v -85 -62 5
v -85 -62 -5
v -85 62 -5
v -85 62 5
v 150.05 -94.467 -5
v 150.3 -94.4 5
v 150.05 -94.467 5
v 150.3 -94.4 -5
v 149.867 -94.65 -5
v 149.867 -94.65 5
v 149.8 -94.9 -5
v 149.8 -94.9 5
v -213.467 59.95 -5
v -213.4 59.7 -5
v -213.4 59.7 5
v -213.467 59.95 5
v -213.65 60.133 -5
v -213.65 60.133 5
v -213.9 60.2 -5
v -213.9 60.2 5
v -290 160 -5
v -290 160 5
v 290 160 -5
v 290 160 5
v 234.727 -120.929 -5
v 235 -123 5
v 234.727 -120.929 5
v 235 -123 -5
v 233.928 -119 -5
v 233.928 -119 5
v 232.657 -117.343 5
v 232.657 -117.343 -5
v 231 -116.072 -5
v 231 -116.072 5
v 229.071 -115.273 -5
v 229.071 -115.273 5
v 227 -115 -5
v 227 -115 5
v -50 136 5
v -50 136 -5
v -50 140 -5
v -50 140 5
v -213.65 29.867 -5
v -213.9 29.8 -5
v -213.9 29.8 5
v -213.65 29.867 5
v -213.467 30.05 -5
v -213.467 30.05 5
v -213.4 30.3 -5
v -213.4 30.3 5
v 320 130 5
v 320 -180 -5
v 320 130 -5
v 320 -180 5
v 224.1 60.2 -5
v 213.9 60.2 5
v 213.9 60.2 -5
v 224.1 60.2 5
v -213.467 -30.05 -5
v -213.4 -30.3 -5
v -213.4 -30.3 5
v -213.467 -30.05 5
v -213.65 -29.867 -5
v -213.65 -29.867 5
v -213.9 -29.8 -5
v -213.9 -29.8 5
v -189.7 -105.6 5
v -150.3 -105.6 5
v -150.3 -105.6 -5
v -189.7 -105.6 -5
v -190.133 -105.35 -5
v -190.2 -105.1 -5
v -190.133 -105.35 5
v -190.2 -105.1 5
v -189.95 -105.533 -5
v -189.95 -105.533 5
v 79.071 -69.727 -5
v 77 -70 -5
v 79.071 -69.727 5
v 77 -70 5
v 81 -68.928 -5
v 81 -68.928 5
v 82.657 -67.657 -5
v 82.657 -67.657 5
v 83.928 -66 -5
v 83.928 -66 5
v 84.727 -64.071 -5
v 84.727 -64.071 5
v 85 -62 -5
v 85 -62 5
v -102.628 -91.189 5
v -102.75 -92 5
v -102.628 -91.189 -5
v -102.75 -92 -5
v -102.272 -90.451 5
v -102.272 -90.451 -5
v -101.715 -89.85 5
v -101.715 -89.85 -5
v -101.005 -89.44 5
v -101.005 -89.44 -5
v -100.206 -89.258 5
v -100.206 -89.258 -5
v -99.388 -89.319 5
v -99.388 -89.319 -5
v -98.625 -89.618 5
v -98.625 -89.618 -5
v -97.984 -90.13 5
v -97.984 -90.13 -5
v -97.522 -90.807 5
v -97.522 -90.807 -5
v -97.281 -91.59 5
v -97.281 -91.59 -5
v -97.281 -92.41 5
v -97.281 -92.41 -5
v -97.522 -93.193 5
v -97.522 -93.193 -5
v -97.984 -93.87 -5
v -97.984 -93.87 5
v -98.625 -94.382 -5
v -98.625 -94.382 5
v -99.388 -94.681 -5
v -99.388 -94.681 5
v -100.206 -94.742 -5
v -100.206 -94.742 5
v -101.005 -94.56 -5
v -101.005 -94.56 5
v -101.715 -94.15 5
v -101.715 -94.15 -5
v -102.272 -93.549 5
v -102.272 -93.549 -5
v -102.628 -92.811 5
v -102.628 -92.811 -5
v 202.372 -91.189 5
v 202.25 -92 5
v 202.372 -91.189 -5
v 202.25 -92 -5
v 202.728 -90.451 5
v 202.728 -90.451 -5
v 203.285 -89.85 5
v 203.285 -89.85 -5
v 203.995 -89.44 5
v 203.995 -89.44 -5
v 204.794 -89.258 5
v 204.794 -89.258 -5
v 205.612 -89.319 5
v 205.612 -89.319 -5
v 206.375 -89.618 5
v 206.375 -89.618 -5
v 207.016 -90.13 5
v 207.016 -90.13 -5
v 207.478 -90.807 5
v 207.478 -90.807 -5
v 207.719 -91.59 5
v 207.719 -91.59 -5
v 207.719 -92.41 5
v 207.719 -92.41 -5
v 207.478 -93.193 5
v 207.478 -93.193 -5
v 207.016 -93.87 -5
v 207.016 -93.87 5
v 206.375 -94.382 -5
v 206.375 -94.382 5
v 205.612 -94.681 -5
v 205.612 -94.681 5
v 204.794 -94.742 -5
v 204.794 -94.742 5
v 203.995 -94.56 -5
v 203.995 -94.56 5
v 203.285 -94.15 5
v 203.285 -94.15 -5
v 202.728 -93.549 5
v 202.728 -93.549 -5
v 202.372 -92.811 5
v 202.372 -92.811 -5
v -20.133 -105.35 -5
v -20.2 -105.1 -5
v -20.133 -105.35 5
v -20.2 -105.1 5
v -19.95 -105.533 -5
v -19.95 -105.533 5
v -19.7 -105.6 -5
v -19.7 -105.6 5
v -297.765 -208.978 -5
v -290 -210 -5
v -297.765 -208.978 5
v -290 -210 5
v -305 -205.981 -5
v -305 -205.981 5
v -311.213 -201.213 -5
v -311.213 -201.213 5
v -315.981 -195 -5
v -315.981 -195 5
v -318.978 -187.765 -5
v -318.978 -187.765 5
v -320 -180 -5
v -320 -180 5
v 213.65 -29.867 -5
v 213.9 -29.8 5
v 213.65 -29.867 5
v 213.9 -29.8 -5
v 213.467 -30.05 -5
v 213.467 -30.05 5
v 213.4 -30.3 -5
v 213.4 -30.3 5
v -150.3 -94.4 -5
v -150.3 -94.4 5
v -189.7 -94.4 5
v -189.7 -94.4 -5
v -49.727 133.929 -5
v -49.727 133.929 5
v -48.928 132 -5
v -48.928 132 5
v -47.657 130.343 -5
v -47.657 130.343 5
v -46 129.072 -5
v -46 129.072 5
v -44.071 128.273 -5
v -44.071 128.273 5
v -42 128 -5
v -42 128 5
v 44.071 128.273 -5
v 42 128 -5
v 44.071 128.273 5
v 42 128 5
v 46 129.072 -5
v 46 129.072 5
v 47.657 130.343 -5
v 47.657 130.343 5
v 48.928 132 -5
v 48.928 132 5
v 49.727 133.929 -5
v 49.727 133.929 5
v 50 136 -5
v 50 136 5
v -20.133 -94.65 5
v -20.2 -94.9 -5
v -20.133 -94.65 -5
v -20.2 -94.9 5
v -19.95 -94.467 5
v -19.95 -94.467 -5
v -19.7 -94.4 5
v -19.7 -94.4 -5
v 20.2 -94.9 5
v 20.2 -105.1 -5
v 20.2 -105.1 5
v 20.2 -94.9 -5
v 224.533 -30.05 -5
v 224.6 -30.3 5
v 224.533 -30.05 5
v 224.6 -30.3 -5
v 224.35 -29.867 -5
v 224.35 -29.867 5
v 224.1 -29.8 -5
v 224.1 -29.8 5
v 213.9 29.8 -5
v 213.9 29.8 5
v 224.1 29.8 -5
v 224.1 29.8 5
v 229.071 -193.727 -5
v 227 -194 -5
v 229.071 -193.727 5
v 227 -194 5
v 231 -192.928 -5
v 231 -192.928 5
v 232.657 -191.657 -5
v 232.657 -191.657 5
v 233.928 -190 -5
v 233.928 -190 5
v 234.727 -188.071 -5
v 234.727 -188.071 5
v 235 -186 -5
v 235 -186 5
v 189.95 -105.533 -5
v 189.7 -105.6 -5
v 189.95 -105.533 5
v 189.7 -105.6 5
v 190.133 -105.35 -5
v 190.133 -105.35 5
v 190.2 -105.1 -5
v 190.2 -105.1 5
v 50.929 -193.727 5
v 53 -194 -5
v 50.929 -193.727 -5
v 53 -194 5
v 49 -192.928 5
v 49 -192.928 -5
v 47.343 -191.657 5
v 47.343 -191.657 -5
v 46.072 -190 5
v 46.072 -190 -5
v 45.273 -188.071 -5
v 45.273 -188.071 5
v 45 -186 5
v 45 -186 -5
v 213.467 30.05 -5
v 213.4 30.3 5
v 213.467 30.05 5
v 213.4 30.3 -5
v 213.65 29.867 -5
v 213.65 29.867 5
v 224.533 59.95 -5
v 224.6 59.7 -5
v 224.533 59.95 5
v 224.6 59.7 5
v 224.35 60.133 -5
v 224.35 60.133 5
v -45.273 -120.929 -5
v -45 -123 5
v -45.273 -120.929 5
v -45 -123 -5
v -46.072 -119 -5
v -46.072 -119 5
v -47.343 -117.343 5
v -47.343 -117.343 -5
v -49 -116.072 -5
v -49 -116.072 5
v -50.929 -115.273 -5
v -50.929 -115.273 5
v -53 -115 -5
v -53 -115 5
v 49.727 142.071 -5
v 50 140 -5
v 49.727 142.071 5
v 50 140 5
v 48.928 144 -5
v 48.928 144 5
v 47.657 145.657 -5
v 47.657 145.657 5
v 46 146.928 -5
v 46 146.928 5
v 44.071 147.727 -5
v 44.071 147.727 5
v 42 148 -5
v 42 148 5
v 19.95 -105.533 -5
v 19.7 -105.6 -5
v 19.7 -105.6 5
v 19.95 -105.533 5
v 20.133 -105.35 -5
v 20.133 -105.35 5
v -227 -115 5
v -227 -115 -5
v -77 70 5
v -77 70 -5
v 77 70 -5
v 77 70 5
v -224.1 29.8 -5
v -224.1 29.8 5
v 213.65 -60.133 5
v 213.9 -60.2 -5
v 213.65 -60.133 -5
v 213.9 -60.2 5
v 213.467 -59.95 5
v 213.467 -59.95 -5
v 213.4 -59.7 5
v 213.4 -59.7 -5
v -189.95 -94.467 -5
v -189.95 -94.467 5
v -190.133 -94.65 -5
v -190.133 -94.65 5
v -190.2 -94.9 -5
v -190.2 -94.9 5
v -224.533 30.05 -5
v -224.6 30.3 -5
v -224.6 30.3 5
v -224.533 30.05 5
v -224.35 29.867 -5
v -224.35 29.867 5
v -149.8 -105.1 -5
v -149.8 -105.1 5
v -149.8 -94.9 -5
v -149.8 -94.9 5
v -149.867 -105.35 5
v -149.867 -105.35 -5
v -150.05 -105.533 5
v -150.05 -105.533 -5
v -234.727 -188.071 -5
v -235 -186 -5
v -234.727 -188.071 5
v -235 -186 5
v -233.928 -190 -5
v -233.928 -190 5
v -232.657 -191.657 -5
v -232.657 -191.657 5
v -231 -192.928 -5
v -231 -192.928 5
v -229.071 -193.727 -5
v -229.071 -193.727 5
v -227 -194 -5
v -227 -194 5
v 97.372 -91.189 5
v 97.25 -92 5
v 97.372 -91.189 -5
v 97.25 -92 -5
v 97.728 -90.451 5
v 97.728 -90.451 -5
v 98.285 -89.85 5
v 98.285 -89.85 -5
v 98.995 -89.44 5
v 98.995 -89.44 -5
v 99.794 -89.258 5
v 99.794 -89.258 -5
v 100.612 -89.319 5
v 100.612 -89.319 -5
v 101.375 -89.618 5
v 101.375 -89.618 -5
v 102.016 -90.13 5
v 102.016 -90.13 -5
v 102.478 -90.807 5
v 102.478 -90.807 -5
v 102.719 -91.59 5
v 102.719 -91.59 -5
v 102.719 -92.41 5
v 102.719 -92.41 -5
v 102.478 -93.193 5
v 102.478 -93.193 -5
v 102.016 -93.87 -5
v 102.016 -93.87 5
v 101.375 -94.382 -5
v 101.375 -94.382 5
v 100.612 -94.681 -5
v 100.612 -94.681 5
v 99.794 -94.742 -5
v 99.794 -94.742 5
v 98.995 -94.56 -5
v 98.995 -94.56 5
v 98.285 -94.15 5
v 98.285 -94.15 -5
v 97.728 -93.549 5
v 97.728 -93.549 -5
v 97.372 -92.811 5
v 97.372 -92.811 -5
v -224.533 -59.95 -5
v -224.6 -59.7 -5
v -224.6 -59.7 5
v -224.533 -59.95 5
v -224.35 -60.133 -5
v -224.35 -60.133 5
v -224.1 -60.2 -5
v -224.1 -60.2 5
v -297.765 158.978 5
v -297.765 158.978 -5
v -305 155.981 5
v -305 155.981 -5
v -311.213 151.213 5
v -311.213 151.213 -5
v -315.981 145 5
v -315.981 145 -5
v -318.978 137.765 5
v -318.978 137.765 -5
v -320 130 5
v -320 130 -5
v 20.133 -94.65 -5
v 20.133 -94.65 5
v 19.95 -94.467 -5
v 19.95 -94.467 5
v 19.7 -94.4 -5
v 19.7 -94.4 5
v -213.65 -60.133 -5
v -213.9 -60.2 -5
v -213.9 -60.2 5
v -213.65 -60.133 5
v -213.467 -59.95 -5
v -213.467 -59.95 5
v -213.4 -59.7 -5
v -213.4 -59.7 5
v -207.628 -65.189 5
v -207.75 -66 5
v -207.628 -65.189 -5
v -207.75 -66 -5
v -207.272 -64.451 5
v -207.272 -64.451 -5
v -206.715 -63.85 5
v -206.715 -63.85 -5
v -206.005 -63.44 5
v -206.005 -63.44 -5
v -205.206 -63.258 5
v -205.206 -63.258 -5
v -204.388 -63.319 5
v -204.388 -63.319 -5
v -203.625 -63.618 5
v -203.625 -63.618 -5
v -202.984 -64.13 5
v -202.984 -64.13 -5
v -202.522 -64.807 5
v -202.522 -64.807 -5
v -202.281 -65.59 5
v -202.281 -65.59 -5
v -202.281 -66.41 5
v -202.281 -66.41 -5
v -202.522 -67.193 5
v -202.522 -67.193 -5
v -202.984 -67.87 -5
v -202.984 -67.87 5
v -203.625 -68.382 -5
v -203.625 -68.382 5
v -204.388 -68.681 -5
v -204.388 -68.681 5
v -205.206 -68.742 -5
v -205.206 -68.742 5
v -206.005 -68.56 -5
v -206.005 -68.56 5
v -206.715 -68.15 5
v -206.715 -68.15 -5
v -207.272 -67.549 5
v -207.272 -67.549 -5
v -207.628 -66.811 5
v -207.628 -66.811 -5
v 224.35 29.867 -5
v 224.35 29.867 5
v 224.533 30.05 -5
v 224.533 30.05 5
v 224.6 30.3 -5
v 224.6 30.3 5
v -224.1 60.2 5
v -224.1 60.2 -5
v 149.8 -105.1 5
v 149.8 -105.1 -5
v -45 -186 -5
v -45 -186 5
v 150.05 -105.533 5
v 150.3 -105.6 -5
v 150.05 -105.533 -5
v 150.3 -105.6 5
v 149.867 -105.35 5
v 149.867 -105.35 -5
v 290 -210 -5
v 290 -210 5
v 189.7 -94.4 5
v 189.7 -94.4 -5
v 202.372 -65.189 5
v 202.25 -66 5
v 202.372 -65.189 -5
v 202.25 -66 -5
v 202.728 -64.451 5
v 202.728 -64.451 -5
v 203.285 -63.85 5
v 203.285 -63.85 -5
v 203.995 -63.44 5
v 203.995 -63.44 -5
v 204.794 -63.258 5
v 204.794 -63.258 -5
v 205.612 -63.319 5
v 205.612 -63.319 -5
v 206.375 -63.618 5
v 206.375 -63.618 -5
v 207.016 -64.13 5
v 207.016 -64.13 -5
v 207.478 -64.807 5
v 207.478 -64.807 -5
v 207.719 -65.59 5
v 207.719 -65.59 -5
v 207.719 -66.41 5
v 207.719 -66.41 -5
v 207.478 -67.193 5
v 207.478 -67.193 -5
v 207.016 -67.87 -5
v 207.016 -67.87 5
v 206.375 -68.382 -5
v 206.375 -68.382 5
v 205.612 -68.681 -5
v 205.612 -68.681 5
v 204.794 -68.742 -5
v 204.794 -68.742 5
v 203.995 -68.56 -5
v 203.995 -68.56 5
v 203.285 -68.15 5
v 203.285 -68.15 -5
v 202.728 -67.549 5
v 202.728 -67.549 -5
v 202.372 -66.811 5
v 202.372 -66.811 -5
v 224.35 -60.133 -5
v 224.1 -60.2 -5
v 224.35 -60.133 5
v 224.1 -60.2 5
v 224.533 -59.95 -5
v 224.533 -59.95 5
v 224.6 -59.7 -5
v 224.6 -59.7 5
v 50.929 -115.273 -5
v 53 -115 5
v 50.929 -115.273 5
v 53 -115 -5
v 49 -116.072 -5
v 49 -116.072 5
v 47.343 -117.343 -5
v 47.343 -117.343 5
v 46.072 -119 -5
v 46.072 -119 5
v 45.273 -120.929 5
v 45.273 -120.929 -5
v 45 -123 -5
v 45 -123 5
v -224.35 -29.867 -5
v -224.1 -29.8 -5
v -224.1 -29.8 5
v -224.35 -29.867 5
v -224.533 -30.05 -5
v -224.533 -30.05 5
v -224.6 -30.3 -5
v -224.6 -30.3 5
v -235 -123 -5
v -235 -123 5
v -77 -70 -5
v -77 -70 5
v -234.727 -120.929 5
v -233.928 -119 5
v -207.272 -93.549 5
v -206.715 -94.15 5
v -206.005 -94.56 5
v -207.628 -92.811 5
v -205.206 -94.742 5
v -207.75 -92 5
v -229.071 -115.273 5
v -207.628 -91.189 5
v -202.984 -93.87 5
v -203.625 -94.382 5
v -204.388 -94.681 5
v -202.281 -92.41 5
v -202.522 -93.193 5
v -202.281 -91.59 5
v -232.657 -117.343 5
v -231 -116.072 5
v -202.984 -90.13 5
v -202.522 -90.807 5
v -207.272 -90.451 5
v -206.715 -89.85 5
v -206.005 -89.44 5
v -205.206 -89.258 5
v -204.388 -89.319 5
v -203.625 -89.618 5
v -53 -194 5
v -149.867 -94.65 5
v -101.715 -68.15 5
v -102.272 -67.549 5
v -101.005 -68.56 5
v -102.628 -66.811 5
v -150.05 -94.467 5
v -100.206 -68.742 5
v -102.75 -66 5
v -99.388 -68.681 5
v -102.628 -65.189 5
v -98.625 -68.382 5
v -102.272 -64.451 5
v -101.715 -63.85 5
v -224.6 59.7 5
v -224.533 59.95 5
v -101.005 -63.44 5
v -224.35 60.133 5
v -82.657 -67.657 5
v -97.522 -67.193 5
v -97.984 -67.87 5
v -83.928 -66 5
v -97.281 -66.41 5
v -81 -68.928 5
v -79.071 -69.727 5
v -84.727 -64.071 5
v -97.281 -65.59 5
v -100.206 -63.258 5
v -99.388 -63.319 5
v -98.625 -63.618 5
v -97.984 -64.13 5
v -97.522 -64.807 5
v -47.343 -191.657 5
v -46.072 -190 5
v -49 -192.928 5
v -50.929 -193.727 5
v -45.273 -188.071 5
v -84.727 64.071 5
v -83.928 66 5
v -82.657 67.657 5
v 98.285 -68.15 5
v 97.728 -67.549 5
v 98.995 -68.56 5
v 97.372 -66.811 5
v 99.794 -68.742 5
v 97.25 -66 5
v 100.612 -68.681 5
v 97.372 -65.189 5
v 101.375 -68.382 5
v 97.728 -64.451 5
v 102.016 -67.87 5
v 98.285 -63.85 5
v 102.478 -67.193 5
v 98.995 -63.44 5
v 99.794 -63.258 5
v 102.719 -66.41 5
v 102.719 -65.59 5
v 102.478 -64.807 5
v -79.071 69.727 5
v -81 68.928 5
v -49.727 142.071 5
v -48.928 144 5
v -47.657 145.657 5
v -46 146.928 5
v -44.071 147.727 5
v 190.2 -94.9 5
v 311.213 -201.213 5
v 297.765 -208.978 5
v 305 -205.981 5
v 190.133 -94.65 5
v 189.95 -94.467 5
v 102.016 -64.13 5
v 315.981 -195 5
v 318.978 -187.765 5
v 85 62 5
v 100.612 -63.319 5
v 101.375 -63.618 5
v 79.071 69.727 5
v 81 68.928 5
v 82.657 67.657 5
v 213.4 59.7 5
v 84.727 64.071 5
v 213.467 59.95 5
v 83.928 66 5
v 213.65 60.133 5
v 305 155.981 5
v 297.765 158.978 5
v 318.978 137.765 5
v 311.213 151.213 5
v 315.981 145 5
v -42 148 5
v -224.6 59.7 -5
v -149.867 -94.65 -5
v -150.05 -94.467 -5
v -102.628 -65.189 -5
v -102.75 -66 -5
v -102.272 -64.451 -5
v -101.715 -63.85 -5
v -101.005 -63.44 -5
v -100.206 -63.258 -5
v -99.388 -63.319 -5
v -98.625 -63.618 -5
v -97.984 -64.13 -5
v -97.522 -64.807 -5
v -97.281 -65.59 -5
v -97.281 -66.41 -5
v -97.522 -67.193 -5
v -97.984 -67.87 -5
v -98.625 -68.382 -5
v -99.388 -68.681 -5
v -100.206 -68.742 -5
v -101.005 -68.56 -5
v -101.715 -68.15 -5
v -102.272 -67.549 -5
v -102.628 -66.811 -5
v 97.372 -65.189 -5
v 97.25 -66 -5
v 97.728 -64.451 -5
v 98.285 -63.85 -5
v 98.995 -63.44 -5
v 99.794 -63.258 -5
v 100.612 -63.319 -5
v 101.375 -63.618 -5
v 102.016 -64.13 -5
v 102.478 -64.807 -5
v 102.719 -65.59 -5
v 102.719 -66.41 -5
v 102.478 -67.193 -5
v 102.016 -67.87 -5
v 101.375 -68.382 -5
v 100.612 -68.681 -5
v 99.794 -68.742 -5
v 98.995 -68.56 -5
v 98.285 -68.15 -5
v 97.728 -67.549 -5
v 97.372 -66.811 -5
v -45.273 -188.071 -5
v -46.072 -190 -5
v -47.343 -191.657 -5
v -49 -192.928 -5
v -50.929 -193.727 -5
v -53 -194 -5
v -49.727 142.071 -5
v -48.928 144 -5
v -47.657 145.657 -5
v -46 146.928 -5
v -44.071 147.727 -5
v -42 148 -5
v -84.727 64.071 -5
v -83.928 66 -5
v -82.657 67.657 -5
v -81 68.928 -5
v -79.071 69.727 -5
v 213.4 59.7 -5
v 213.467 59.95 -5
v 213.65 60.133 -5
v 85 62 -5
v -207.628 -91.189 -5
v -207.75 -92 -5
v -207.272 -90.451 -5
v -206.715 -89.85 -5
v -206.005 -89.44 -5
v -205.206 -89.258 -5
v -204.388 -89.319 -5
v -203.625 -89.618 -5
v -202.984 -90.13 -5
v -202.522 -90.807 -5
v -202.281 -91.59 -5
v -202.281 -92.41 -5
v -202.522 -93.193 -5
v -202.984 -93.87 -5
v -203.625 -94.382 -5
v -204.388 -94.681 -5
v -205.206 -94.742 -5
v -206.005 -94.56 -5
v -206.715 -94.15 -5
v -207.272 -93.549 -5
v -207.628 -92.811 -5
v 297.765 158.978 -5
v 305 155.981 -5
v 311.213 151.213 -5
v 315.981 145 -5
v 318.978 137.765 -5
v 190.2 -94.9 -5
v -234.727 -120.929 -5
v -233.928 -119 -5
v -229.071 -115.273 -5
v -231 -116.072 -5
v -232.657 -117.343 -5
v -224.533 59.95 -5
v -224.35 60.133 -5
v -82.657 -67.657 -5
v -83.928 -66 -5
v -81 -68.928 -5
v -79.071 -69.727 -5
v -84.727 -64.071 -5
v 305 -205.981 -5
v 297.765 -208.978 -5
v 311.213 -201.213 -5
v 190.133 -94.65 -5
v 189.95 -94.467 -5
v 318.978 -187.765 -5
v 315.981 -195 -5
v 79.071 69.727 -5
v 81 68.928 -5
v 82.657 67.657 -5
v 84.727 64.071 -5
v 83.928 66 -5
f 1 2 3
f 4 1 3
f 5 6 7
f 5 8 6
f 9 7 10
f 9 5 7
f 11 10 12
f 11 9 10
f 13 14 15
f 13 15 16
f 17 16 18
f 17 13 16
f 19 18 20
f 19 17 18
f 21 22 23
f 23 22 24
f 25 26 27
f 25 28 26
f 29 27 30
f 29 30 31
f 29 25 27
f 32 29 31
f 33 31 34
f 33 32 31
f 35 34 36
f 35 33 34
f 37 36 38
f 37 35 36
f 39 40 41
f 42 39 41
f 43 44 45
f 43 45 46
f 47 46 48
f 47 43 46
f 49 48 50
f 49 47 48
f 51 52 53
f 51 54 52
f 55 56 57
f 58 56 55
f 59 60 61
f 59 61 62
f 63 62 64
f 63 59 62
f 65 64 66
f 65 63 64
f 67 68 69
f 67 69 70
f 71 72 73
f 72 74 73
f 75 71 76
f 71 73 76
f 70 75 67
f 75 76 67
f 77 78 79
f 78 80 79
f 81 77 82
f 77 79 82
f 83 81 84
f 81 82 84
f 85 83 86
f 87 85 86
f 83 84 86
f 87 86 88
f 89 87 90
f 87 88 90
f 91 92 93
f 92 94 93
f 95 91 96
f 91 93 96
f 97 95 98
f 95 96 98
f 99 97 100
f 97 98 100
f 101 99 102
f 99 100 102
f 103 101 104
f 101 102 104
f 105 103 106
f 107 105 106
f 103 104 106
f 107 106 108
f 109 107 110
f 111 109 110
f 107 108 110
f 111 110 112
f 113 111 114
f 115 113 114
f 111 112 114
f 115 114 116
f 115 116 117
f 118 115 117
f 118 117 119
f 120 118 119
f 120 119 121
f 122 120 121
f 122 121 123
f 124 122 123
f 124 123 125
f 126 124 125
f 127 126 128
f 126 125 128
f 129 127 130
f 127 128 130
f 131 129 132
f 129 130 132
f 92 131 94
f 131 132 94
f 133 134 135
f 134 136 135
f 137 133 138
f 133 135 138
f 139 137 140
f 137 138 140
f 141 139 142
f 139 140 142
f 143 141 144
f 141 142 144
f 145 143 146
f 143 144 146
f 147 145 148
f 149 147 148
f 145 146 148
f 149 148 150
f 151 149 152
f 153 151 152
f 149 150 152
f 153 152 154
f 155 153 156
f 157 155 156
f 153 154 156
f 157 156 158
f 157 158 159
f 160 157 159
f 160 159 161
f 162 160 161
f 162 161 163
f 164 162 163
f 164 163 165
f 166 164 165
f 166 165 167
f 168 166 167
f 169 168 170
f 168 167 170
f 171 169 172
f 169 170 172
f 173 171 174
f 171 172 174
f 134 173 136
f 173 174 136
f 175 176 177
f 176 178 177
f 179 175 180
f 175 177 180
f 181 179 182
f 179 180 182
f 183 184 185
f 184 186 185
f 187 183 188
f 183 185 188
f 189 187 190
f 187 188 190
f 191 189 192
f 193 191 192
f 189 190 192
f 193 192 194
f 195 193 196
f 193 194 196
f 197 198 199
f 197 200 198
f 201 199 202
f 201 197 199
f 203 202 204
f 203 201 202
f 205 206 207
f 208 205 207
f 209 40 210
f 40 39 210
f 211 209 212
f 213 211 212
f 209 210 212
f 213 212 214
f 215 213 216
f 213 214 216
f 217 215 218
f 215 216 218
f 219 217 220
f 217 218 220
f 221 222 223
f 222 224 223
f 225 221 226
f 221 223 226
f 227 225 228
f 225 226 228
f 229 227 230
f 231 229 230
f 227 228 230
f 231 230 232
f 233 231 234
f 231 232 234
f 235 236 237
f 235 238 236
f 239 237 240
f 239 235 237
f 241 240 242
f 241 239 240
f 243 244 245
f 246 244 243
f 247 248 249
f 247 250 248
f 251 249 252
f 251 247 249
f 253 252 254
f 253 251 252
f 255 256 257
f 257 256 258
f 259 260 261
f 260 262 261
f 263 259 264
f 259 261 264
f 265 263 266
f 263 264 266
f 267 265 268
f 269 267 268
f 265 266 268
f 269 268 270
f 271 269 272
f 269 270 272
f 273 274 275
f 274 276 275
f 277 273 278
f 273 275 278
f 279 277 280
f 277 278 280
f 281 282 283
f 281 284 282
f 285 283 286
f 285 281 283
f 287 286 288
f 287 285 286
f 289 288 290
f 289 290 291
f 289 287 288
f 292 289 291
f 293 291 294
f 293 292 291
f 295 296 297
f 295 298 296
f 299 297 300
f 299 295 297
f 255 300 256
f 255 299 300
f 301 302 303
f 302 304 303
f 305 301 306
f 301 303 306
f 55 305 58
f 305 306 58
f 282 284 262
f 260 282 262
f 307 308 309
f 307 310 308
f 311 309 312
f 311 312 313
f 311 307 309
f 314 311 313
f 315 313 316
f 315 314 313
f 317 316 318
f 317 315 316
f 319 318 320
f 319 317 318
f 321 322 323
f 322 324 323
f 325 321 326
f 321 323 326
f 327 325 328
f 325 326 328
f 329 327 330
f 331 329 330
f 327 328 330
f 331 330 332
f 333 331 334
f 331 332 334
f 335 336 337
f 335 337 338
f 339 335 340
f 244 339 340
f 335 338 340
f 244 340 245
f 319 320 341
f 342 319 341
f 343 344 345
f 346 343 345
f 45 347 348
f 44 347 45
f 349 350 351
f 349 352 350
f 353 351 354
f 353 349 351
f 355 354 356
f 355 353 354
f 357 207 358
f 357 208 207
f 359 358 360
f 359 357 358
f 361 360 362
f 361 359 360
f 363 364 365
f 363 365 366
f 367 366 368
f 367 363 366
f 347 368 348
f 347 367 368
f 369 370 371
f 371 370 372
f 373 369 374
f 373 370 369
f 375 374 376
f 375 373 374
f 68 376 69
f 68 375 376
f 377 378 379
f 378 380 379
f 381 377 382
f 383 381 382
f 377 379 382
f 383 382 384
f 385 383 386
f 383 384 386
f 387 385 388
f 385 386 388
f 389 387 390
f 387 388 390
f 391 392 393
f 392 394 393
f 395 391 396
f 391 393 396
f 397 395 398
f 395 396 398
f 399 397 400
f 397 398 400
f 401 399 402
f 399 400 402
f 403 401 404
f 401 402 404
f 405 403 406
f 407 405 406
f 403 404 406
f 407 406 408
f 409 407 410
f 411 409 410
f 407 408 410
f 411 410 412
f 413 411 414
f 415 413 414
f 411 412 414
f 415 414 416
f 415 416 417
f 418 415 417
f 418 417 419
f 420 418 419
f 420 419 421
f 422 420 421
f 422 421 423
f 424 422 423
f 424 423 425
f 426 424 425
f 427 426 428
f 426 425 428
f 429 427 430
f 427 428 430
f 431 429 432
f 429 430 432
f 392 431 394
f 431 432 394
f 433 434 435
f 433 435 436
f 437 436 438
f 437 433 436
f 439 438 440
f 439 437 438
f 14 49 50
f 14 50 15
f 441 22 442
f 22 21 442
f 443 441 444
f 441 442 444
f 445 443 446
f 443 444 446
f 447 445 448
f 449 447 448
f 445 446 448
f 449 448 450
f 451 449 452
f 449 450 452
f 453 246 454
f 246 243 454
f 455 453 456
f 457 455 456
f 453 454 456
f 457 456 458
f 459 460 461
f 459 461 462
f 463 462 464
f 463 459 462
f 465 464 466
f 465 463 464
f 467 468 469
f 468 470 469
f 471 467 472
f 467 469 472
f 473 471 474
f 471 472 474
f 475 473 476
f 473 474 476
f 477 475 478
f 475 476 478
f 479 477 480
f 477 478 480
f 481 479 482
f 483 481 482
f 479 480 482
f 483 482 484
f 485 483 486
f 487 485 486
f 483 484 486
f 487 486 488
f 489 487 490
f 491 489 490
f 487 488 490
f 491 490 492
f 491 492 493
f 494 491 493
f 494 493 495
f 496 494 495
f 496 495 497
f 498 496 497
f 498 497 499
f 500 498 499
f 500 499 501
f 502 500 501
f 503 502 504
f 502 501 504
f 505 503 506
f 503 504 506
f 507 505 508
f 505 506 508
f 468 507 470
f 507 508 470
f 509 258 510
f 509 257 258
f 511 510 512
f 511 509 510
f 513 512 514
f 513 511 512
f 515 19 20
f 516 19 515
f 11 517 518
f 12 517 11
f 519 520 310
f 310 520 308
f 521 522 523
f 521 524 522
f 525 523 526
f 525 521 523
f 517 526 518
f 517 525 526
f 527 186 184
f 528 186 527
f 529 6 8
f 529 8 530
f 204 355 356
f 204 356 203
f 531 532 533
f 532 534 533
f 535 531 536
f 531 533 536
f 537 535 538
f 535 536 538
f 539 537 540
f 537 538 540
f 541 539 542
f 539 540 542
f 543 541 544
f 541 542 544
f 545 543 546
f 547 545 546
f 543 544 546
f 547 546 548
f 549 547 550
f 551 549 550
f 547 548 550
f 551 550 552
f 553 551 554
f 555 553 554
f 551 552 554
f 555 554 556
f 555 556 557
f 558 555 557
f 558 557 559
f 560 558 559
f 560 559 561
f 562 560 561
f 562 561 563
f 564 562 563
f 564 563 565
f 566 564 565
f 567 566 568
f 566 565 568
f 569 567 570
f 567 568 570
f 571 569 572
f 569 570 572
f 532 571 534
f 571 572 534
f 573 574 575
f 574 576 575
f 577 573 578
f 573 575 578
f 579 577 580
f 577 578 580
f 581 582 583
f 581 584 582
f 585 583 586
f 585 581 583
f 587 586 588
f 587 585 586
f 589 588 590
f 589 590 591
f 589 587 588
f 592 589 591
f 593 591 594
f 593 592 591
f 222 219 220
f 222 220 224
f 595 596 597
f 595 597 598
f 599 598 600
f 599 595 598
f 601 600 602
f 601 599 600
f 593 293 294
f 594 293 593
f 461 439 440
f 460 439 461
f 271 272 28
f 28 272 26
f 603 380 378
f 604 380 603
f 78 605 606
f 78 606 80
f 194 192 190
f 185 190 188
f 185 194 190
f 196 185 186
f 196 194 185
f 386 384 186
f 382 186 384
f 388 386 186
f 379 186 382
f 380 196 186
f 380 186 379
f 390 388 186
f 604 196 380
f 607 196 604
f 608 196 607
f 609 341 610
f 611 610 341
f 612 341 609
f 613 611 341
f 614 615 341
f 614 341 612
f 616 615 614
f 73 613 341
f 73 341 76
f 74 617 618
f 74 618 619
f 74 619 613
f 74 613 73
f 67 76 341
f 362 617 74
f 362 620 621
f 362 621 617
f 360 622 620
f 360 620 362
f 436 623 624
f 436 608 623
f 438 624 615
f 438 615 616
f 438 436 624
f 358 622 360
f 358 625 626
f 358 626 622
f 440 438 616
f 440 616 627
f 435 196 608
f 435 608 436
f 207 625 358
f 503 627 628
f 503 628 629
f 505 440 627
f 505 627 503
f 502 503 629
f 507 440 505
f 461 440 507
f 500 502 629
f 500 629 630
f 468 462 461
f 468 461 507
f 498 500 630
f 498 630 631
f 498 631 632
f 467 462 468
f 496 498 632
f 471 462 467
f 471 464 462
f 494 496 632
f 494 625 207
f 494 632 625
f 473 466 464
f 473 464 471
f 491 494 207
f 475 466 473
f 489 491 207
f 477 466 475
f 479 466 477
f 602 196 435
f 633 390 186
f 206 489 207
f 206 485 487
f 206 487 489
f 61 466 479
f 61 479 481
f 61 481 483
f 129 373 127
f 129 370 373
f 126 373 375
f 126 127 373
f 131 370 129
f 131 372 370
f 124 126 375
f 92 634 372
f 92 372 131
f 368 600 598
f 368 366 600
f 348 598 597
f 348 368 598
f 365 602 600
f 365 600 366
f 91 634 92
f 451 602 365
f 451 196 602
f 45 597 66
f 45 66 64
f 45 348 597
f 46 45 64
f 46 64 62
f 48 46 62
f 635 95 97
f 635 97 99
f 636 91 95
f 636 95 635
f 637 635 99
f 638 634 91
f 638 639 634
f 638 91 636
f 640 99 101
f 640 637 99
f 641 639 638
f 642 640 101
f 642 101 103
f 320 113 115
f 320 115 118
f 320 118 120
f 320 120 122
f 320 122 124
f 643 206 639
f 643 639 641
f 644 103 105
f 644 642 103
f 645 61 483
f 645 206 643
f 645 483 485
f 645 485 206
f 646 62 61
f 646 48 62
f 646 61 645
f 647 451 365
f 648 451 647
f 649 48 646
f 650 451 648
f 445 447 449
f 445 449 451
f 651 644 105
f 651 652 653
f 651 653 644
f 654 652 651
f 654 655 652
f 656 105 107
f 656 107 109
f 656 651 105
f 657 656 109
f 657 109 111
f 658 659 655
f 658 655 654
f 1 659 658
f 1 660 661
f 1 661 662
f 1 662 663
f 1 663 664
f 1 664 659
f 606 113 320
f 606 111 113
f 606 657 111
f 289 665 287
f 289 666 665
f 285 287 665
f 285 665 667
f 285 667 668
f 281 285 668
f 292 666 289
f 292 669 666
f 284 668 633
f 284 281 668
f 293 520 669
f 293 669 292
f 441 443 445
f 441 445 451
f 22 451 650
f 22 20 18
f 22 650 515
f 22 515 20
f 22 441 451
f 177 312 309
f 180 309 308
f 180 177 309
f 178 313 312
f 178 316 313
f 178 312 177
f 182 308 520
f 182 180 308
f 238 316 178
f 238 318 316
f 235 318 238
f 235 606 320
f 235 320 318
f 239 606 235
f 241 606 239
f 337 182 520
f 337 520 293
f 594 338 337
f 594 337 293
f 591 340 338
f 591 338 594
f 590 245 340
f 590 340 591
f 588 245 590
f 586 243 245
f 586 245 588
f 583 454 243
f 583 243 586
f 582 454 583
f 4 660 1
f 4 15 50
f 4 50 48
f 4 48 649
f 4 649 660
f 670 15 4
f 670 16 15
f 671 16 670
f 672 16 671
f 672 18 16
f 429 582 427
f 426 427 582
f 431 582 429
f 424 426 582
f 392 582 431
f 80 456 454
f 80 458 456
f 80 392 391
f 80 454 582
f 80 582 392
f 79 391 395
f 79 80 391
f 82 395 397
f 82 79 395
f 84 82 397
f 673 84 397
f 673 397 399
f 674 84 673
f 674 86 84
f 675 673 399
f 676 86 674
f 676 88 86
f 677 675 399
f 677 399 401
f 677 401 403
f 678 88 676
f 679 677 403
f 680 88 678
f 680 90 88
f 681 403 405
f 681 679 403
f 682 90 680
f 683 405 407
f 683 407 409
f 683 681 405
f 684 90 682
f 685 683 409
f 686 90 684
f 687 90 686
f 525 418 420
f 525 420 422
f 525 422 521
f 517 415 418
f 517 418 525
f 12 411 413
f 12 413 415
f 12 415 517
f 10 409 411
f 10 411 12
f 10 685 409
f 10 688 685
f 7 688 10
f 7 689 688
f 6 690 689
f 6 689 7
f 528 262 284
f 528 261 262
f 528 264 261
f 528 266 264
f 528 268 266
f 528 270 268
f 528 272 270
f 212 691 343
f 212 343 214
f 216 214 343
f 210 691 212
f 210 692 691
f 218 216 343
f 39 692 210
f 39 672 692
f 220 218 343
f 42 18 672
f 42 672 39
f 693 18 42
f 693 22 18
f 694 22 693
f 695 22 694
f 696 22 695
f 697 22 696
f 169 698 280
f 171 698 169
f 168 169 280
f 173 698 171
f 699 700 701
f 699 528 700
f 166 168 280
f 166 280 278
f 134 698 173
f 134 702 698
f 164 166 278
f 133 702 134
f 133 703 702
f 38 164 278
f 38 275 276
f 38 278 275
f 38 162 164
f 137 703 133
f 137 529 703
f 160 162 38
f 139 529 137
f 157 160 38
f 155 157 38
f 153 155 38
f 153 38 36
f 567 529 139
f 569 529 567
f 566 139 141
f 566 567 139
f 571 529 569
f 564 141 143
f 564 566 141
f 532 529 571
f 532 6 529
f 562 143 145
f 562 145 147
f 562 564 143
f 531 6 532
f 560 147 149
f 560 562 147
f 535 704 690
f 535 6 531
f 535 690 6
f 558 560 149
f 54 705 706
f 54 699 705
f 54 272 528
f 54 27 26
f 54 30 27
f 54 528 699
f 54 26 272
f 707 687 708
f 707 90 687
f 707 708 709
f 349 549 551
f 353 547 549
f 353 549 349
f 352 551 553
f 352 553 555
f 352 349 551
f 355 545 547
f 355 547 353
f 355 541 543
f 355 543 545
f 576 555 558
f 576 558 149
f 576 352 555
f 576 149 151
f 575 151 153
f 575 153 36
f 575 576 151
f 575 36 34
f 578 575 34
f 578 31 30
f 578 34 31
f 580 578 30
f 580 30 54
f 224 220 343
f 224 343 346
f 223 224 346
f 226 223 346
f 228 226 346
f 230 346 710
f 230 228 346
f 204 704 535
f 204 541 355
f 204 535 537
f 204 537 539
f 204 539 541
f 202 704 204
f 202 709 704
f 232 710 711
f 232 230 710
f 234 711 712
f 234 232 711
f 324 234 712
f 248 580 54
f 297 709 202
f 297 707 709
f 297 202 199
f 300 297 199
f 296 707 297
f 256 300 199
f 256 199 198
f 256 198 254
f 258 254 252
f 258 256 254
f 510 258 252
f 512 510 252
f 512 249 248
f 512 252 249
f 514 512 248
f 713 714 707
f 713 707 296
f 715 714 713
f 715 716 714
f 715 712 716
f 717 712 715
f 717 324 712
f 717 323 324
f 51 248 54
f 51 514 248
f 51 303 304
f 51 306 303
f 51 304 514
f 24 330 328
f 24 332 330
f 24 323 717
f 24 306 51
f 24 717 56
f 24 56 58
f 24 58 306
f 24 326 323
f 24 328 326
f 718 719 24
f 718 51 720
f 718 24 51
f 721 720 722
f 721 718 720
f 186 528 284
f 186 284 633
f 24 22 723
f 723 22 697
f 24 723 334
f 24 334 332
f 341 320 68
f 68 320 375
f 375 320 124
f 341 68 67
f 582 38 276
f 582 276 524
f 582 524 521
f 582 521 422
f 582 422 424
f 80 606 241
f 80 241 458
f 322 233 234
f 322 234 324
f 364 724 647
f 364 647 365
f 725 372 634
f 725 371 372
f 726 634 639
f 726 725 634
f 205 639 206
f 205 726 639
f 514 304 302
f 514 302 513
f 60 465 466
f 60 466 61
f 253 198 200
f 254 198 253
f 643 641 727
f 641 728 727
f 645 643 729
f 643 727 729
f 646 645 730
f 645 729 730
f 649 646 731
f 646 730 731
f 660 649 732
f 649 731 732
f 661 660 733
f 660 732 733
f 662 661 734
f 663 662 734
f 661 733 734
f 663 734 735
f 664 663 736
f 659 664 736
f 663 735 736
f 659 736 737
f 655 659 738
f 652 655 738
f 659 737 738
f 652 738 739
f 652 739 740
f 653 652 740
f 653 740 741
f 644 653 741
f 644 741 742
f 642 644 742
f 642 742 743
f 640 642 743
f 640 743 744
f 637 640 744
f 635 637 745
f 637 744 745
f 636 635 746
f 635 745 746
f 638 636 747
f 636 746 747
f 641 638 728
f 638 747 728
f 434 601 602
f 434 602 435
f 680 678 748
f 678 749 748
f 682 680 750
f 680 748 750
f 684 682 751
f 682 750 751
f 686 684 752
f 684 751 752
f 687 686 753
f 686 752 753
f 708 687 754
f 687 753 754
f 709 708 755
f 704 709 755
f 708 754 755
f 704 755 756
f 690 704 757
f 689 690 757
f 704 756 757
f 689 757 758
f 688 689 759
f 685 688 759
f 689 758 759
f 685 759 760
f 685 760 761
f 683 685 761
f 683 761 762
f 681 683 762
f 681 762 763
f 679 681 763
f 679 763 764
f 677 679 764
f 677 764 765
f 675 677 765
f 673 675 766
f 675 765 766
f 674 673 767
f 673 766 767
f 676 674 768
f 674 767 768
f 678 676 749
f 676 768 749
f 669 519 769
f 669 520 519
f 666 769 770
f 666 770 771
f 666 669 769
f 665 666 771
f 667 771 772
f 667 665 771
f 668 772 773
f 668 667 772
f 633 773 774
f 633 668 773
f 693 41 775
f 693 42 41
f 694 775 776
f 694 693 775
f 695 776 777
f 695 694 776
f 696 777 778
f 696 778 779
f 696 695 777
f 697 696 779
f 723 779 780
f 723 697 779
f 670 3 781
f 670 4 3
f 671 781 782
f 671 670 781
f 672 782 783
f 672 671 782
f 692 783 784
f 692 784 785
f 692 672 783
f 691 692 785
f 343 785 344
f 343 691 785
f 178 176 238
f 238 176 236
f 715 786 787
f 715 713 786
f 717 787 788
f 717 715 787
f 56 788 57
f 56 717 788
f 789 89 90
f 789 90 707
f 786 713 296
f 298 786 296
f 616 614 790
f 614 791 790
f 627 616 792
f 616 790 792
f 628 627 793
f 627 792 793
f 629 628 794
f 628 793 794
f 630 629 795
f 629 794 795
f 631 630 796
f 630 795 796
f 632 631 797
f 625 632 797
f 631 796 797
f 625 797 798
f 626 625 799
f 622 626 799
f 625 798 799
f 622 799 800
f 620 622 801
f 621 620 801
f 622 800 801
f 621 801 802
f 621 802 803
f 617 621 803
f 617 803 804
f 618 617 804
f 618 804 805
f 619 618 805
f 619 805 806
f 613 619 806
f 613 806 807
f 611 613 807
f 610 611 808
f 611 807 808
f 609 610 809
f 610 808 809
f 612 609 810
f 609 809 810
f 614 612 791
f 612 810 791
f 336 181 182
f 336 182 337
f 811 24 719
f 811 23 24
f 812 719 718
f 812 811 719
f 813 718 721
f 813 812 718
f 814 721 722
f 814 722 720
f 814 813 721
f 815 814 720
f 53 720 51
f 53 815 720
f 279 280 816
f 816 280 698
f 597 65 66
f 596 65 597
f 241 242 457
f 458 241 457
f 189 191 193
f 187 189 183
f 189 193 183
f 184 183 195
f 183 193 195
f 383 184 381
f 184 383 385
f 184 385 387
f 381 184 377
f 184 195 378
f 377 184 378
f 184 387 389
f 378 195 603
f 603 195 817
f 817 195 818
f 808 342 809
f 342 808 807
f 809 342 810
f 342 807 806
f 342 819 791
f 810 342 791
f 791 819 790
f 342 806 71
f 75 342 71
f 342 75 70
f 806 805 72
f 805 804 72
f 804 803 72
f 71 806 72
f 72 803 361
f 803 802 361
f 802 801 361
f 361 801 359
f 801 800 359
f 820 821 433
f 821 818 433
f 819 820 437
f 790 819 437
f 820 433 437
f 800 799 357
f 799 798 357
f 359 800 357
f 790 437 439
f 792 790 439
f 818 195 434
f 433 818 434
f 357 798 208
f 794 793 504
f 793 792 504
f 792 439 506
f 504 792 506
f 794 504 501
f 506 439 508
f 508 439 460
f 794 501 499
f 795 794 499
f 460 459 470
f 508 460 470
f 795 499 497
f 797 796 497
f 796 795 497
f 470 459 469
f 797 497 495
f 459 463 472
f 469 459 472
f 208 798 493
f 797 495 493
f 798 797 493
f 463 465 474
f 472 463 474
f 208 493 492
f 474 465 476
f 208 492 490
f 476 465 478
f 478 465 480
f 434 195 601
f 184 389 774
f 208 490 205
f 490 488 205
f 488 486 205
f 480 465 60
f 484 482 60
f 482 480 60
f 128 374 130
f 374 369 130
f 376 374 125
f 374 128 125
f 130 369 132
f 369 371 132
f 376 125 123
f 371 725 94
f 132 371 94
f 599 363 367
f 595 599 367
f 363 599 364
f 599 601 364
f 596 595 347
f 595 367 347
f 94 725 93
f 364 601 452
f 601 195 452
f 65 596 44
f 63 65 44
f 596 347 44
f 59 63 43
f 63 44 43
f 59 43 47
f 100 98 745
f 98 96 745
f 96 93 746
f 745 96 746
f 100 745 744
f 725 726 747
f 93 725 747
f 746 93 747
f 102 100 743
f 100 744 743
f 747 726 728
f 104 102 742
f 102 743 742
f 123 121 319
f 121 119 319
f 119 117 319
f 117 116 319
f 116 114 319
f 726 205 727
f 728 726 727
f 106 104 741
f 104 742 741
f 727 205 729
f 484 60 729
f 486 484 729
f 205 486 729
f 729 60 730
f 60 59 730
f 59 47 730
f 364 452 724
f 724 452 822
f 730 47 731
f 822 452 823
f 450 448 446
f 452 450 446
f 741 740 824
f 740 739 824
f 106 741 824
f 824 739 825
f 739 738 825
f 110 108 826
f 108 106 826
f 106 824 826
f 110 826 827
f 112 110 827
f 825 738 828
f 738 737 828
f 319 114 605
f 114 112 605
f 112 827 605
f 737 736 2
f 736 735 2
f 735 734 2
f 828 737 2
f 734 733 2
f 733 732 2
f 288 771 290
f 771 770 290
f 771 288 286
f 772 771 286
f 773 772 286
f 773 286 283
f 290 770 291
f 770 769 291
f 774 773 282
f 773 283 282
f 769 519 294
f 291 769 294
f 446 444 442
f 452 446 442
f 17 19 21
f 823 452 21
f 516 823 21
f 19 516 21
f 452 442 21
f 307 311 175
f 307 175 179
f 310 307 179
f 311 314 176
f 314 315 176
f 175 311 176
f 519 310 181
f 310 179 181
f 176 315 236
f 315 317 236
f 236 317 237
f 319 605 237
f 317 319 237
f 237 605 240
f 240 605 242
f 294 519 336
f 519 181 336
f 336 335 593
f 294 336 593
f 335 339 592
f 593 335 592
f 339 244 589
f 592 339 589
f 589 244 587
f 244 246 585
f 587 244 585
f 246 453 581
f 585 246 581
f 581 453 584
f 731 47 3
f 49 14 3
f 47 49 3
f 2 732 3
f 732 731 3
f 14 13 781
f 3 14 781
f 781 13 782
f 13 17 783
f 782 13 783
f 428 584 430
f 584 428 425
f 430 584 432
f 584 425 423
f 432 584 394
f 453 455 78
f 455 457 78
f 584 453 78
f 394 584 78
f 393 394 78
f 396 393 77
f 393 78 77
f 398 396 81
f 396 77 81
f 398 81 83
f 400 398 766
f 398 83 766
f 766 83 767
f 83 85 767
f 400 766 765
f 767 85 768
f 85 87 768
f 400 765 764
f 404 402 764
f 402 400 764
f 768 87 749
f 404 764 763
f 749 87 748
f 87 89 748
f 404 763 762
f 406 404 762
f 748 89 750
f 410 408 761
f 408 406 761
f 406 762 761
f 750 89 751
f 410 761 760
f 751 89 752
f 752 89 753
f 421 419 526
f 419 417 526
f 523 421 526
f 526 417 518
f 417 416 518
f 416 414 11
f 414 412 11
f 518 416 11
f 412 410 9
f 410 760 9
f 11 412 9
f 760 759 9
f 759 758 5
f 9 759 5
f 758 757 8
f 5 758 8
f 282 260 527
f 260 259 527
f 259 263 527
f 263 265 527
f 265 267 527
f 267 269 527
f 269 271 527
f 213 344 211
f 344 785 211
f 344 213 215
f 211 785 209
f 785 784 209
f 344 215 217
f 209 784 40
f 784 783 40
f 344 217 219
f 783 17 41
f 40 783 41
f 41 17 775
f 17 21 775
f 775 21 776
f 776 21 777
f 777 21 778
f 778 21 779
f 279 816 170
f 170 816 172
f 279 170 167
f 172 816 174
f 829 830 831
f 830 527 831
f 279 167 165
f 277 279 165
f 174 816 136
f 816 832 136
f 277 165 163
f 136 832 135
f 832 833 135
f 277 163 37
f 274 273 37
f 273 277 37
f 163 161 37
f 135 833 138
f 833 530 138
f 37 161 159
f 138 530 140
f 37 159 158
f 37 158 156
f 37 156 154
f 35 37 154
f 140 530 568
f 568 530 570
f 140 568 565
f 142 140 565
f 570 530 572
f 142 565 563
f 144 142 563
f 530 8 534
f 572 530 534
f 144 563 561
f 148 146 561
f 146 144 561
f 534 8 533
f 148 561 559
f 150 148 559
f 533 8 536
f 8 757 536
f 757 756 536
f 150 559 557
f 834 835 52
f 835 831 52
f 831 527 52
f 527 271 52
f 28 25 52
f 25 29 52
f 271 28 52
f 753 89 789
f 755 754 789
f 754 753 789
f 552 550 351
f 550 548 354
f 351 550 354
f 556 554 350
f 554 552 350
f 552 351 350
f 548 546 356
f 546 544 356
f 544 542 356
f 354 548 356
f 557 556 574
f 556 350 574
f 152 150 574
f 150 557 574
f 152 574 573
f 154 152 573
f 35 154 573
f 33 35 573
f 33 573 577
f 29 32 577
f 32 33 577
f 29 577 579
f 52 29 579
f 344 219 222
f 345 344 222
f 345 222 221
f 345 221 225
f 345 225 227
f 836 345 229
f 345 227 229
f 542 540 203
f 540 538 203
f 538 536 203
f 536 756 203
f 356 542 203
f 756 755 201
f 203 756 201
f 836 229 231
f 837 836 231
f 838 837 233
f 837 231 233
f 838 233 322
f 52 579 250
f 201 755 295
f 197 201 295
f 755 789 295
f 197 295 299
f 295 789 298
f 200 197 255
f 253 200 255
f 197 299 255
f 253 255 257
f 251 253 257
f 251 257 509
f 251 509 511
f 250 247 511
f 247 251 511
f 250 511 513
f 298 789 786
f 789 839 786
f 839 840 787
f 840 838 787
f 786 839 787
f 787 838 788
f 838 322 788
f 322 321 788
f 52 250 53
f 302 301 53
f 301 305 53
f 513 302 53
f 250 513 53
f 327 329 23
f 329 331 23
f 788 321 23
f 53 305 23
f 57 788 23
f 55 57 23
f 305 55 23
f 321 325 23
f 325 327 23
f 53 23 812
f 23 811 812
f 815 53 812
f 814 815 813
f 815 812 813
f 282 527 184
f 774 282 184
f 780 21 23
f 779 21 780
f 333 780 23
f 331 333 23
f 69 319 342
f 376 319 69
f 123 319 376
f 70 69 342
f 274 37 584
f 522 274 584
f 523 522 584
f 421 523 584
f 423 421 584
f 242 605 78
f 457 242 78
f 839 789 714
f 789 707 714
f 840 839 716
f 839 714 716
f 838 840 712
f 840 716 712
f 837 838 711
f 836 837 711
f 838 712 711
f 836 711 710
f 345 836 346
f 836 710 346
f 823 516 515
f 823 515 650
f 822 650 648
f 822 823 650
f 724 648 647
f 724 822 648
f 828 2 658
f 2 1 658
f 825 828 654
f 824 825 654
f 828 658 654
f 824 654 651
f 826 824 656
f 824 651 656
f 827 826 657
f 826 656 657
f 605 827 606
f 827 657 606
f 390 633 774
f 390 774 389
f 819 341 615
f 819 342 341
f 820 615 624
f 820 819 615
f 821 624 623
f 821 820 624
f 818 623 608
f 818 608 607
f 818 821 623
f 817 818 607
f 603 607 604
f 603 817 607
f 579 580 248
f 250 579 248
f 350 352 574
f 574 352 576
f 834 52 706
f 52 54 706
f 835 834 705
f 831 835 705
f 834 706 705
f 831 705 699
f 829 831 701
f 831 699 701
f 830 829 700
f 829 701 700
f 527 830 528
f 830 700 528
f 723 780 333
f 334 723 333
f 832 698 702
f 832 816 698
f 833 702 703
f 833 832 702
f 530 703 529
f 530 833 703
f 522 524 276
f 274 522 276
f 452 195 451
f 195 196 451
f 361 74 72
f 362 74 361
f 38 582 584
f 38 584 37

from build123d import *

# Parameters (mm, degrees)
SKETCH_1_W                  = 640
SKETCH_1_H                  = 370
EXTRUDE_1618_DEPTH          = 5
SKETCH_2_W                  = 190
SKETCH_2_H                  = 79
CUT_EXTRUDE_1669_DEPTH      = 383.785840908
FILLET_R_R                  = 8
FILLET_R_OF_MIRROR_1948_R   = 8
CUT_EXTRUDE_1976_DEPTH      = 383.785840908
CUT_EXTRUDE_1976_DEPTH_BACK = 383.785840908
SKETCH_3_W                  = 170
SKETCH_3_H                  = 140
FILLET_R_2_R                = 8
SKETCH_4_W                  = 11.2
SKETCH_4_H                  = 30.4
CUT_EXTRUDE_2232_DEPTH      = 383.785840908
FILLET_R_3_R                = 0.5
FILLET_R_3_OF_MIRROR_2515_R = 0.5
MIRROR_START                = -5
MIRROR_2537_DEPTH           = 10
CUT_EXTRUDE_2565_DEPTH      = 383.785840908
CUT_EXTRUDE_2565_DEPTH_BACK = 383.785840908
SKETCH_5_W                  = 40.4
SKETCH_5_H                  = 11.2
FILLET_R_4_R                = 0.5
SKETCH_6_W                  = 40.4
SKETCH_6_H                  = 11.2
CUT_EXTRUDE_2821_DEPTH      = 383.785840908
FILLET_R_5_R                = 0.5
FILLET_R_5_OF_MIRROR_3088_R = 0.5
CUT_EXTRUDE_3116_DEPTH      = 383.785840908
CUT_EXTRUDE_3116_DEPTH_BACK = 383.785840908
SKETCH_7_W                  = 100
SKETCH_7_H                  = 20
FILLET_R_6_R                = 8
HOLE_WIZARD_3368_D          = 5.5
HOLE_WIZARD_3368_DEPTH      = 10
HOLE_WIZARD_3368_TIP        = 1.652366702
FILLET_R_7_R                = 30


# Read off the part's stored shape, not the designer's step: 角穴 筒受け・筒押え(後)
with BuildPart() as part:
    # ｽｹｯﾁ1 → Extrude 1618 (new, symmetric)
    with BuildSketch(Plane.XY):
        with Locations((0, -25)):
            Rectangle(SKETCH_1_W, SKETCH_1_H)
    extrude(amount=EXTRUDE_1618_DEPTH, both=True)

    # ｽｹｯﾁ2 → Cut-Extrude 1669 (cut, symmetric)
    with BuildSketch(Plane.XY):
        with Locations((140, -154.5)):
            Rectangle(SKETCH_2_W, SKETCH_2_H)
    cut_extrude_1669 = extrude(amount=CUT_EXTRUDE_1669_DEPTH, both=True, mode=Mode.SUBTRACT)

    # Fillet R
    fillet_r_edges = [part.edges().sort_by_distance(p)[0] for p in [
        (45, -194, 0),
        (45, -115, 0),
        (235, -115, 0),
        (235, -194, 0),
    ]]
    fillet(fillet_r_edges, radius=FILLET_R_R)

    # Mirror 1948: Cut-Extrude 1669 across plane
    add(cut_extrude_1669.mirror(Plane(origin=(0, 0, 0), x_dir=(0, 0, 1), z_dir=(1, 0, 0))), mode=Mode.SUBTRACT)

    # Fillet R of Mirror 1948
    fillet_r_of_mirror_1948_edges = [part.edges().sort_by_distance(p)[0] for p in [
        (-45, -194, 0),
        (-45, -115, 0),
        (-235, -115, 0),
        (-235, -194, 0),
    ]]
    fillet(fillet_r_of_mirror_1948_edges, radius=FILLET_R_OF_MIRROR_1948_R)

    # ｽｹｯﾁ3 → Cut-Extrude 1976 (cut, two sides: drawn at the far end of the back side and taken through both)
    with BuildSketch(Plane.XY.offset(-CUT_EXTRUDE_1976_DEPTH_BACK)):
        Rectangle(SKETCH_3_W, SKETCH_3_H)
    extrude(amount=CUT_EXTRUDE_1976_DEPTH + CUT_EXTRUDE_1976_DEPTH_BACK, mode=Mode.SUBTRACT)

    # Fillet R 2
    fillet_r_2_edges = [part.edges().sort_by_distance(p)[0] for p in [
        (-85, -70, 0),
        (-85, 70, 0),
        (85, 70, 0),
        (85, -70, 0),
    ]]
    fillet(fillet_r_2_edges, radius=FILLET_R_2_R)

    # ｽｹｯﾁ4 → Cut-Extrude 2232 (cut, symmetric)
    with BuildSketch(Plane.XY):
        with Locations((219, -45)):
            Rectangle(SKETCH_4_W, SKETCH_4_H)
    cut_extrude_2232 = extrude(amount=CUT_EXTRUDE_2232_DEPTH, both=True, mode=Mode.SUBTRACT)

    # Fillet R 3
    fillet_r_3_edges = [part.edges().sort_by_distance(p)[0] for p in [
        (213.4, -60.2, 0),
        (213.4, -29.8, 0),
        (224.6, -29.8, 0),
        (224.6, -60.2, 0),
    ]]
    fillet(fillet_r_3_edges, radius=FILLET_R_3_R)

    # Mirror 2515: Cut-Extrude 2232 across plane
    add(cut_extrude_2232.mirror(Plane.ZX), mode=Mode.SUBTRACT)

    # Fillet R 3 of Mirror 2515
    fillet_r_3_of_mirror_2515_edges = [part.edges().sort_by_distance(p)[0] for p in [
        (213.4, 60.2, 0),
        (213.4, 29.8, 0),
        (224.6, 29.8, 0),
        (224.6, 60.2, 0),
    ]]
    fillet(fillet_r_3_of_mirror_2515_edges, radius=FILLET_R_3_OF_MIRROR_2515_R)

    # Mirror 2537 outline → Mirror 2537 (cut)
    with BuildSketch(Plane.XY.offset(MIRROR_START)):
        with BuildLine():
            Line((-213.9, -29.8), (-224.1, -29.8))
            ThreePointArc((-224.1, -29.8), (-224.453553391, -29.946446609), (-224.6, -30.3))
            Line((-224.6, -30.3), (-224.6, -59.7))
            ThreePointArc((-224.6, -59.7), (-224.453553391, -60.053553391), (-224.1, -60.2))
            Line((-224.1, -60.2), (-213.9, -60.2))
            ThreePointArc((-213.9, -60.2), (-213.546446609, -60.053553391), (-213.4, -59.7))
            Line((-213.4, -59.7), (-213.4, -30.3))
            ThreePointArc((-213.4, -30.3), (-213.546446609, -29.946446609), (-213.9, -29.8))
        make_face()
        with BuildLine():
            ThreePointArc((-213.4, 59.7), (-213.546446609, 60.053553391), (-213.9, 60.2))
            Line((-213.9, 60.2), (-224.1, 60.2))
            ThreePointArc((-224.1, 60.2), (-224.453553391, 60.053553391), (-224.6, 59.7))
            Line((-224.6, 59.7), (-224.6, 30.3))
            ThreePointArc((-224.6, 30.3), (-224.453553391, 29.946446609), (-224.1, 29.8))
            Line((-224.1, 29.8), (-213.9, 29.8))
            ThreePointArc((-213.9, 29.8), (-213.546446609, 29.946446609), (-213.4, 30.3))
            Line((-213.4, 30.3), (-213.4, 59.7))
        make_face()
    extrude(amount=MIRROR_2537_DEPTH, mode=Mode.SUBTRACT)

    # ｽｹｯﾁ5 → Cut-Extrude 2565 (cut, two sides: drawn at the far end of the back side and taken through both)
    with BuildSketch(Plane.XY.offset(-CUT_EXTRUDE_2565_DEPTH_BACK)):
        with Locations((0, -100)):
            Rectangle(SKETCH_5_W, SKETCH_5_H)
    extrude(amount=CUT_EXTRUDE_2565_DEPTH + CUT_EXTRUDE_2565_DEPTH_BACK, mode=Mode.SUBTRACT)

    # Fillet R 4
    fillet_r_4_edges = [part.edges().sort_by_distance(p)[0] for p in [
        (-20.2, -105.6, 0),
        (-20.2, -94.4, 0),
        (20.2, -94.4, 0),
        (20.2, -105.6, 0),
    ]]
    fillet(fillet_r_4_edges, radius=FILLET_R_4_R)

    # ｽｹｯﾁ6 → Cut-Extrude 2821 (cut, symmetric)
    with BuildSketch(Plane.XY):
        with Locations((170, -100)):
            Rectangle(SKETCH_6_W, SKETCH_6_H)
    cut_extrude_2821 = extrude(amount=CUT_EXTRUDE_2821_DEPTH, both=True, mode=Mode.SUBTRACT)

    # Fillet R 5
    fillet_r_5_edges = [part.edges().sort_by_distance(p)[0] for p in [
        (149.8, -105.6, 0),
        (149.8, -94.4, 0),
        (190.2, -94.4, 0),
        (190.2, -105.6, 0),
    ]]
    fillet(fillet_r_5_edges, radius=FILLET_R_5_R)

    # Mirror 3088: Cut-Extrude 2821 across plane
    add(cut_extrude_2821.mirror(Plane(origin=(0, 0, 0), x_dir=(0, 0, 1), z_dir=(1, 0, 0))), mode=Mode.SUBTRACT)

    # Fillet R 5 of Mirror 3088
    fillet_r_5_of_mirror_3088_edges = [part.edges().sort_by_distance(p)[0] for p in [
        (-149.8, -105.6, 0),
        (-149.8, -94.4, 0),
        (-190.2, -94.4, 0),
        (-190.2, -105.6, 0),
    ]]
    fillet(fillet_r_5_of_mirror_3088_edges, radius=FILLET_R_5_OF_MIRROR_3088_R)

    # ｽｹｯﾁ7 → Cut-Extrude 3116 (cut, two sides: drawn at the far end of the back side and taken through both)
    with BuildSketch(Plane.XY.offset(-CUT_EXTRUDE_3116_DEPTH_BACK)):
        with Locations((0, 138)):
            Rectangle(SKETCH_7_W, SKETCH_7_H)
    extrude(amount=CUT_EXTRUDE_3116_DEPTH + CUT_EXTRUDE_3116_DEPTH_BACK, mode=Mode.SUBTRACT)

    # Fillet R 6
    fillet_r_6_edges = [part.edges().sort_by_distance(p)[0] for p in [
        (-50, 128, 0),
        (-50, 148, 0),
        (50, 148, 0),
        (50, 128, 0),
    ]]
    fillet(fillet_r_6_edges, radius=FILLET_R_6_R)

    # Hole Wizard 3368
    with Locations(Plane.XY.offset(5)):
        with Locations((100, -66), (100, -92), (-100, -66), (-100, -92), (205, -66), (205, -92), (-205, -66), (-205, -92)):
            Hole(HOLE_WIZARD_3368_D / 2, depth=HOLE_WIZARD_3368_DEPTH)
            with Locations((0, 0, -(HOLE_WIZARD_3368_DEPTH + HOLE_WIZARD_3368_TIP / 2))):  # 118° drill point
                Cone(0, HOLE_WIZARD_3368_D / 2, HOLE_WIZARD_3368_TIP, mode=Mode.SUBTRACT)

    # Fillet R 7
    fillet_r_7_edges = [part.edges().sort_by_distance(p)[0] for p in [
        (-320, 160, 0),
        (320, 160, 0),
        (320, -210, 0),
        (-320, -210, 0),
    ]]
    fillet(fillet_r_7_edges, radius=FILLET_R_7_R)


solid = part.part
